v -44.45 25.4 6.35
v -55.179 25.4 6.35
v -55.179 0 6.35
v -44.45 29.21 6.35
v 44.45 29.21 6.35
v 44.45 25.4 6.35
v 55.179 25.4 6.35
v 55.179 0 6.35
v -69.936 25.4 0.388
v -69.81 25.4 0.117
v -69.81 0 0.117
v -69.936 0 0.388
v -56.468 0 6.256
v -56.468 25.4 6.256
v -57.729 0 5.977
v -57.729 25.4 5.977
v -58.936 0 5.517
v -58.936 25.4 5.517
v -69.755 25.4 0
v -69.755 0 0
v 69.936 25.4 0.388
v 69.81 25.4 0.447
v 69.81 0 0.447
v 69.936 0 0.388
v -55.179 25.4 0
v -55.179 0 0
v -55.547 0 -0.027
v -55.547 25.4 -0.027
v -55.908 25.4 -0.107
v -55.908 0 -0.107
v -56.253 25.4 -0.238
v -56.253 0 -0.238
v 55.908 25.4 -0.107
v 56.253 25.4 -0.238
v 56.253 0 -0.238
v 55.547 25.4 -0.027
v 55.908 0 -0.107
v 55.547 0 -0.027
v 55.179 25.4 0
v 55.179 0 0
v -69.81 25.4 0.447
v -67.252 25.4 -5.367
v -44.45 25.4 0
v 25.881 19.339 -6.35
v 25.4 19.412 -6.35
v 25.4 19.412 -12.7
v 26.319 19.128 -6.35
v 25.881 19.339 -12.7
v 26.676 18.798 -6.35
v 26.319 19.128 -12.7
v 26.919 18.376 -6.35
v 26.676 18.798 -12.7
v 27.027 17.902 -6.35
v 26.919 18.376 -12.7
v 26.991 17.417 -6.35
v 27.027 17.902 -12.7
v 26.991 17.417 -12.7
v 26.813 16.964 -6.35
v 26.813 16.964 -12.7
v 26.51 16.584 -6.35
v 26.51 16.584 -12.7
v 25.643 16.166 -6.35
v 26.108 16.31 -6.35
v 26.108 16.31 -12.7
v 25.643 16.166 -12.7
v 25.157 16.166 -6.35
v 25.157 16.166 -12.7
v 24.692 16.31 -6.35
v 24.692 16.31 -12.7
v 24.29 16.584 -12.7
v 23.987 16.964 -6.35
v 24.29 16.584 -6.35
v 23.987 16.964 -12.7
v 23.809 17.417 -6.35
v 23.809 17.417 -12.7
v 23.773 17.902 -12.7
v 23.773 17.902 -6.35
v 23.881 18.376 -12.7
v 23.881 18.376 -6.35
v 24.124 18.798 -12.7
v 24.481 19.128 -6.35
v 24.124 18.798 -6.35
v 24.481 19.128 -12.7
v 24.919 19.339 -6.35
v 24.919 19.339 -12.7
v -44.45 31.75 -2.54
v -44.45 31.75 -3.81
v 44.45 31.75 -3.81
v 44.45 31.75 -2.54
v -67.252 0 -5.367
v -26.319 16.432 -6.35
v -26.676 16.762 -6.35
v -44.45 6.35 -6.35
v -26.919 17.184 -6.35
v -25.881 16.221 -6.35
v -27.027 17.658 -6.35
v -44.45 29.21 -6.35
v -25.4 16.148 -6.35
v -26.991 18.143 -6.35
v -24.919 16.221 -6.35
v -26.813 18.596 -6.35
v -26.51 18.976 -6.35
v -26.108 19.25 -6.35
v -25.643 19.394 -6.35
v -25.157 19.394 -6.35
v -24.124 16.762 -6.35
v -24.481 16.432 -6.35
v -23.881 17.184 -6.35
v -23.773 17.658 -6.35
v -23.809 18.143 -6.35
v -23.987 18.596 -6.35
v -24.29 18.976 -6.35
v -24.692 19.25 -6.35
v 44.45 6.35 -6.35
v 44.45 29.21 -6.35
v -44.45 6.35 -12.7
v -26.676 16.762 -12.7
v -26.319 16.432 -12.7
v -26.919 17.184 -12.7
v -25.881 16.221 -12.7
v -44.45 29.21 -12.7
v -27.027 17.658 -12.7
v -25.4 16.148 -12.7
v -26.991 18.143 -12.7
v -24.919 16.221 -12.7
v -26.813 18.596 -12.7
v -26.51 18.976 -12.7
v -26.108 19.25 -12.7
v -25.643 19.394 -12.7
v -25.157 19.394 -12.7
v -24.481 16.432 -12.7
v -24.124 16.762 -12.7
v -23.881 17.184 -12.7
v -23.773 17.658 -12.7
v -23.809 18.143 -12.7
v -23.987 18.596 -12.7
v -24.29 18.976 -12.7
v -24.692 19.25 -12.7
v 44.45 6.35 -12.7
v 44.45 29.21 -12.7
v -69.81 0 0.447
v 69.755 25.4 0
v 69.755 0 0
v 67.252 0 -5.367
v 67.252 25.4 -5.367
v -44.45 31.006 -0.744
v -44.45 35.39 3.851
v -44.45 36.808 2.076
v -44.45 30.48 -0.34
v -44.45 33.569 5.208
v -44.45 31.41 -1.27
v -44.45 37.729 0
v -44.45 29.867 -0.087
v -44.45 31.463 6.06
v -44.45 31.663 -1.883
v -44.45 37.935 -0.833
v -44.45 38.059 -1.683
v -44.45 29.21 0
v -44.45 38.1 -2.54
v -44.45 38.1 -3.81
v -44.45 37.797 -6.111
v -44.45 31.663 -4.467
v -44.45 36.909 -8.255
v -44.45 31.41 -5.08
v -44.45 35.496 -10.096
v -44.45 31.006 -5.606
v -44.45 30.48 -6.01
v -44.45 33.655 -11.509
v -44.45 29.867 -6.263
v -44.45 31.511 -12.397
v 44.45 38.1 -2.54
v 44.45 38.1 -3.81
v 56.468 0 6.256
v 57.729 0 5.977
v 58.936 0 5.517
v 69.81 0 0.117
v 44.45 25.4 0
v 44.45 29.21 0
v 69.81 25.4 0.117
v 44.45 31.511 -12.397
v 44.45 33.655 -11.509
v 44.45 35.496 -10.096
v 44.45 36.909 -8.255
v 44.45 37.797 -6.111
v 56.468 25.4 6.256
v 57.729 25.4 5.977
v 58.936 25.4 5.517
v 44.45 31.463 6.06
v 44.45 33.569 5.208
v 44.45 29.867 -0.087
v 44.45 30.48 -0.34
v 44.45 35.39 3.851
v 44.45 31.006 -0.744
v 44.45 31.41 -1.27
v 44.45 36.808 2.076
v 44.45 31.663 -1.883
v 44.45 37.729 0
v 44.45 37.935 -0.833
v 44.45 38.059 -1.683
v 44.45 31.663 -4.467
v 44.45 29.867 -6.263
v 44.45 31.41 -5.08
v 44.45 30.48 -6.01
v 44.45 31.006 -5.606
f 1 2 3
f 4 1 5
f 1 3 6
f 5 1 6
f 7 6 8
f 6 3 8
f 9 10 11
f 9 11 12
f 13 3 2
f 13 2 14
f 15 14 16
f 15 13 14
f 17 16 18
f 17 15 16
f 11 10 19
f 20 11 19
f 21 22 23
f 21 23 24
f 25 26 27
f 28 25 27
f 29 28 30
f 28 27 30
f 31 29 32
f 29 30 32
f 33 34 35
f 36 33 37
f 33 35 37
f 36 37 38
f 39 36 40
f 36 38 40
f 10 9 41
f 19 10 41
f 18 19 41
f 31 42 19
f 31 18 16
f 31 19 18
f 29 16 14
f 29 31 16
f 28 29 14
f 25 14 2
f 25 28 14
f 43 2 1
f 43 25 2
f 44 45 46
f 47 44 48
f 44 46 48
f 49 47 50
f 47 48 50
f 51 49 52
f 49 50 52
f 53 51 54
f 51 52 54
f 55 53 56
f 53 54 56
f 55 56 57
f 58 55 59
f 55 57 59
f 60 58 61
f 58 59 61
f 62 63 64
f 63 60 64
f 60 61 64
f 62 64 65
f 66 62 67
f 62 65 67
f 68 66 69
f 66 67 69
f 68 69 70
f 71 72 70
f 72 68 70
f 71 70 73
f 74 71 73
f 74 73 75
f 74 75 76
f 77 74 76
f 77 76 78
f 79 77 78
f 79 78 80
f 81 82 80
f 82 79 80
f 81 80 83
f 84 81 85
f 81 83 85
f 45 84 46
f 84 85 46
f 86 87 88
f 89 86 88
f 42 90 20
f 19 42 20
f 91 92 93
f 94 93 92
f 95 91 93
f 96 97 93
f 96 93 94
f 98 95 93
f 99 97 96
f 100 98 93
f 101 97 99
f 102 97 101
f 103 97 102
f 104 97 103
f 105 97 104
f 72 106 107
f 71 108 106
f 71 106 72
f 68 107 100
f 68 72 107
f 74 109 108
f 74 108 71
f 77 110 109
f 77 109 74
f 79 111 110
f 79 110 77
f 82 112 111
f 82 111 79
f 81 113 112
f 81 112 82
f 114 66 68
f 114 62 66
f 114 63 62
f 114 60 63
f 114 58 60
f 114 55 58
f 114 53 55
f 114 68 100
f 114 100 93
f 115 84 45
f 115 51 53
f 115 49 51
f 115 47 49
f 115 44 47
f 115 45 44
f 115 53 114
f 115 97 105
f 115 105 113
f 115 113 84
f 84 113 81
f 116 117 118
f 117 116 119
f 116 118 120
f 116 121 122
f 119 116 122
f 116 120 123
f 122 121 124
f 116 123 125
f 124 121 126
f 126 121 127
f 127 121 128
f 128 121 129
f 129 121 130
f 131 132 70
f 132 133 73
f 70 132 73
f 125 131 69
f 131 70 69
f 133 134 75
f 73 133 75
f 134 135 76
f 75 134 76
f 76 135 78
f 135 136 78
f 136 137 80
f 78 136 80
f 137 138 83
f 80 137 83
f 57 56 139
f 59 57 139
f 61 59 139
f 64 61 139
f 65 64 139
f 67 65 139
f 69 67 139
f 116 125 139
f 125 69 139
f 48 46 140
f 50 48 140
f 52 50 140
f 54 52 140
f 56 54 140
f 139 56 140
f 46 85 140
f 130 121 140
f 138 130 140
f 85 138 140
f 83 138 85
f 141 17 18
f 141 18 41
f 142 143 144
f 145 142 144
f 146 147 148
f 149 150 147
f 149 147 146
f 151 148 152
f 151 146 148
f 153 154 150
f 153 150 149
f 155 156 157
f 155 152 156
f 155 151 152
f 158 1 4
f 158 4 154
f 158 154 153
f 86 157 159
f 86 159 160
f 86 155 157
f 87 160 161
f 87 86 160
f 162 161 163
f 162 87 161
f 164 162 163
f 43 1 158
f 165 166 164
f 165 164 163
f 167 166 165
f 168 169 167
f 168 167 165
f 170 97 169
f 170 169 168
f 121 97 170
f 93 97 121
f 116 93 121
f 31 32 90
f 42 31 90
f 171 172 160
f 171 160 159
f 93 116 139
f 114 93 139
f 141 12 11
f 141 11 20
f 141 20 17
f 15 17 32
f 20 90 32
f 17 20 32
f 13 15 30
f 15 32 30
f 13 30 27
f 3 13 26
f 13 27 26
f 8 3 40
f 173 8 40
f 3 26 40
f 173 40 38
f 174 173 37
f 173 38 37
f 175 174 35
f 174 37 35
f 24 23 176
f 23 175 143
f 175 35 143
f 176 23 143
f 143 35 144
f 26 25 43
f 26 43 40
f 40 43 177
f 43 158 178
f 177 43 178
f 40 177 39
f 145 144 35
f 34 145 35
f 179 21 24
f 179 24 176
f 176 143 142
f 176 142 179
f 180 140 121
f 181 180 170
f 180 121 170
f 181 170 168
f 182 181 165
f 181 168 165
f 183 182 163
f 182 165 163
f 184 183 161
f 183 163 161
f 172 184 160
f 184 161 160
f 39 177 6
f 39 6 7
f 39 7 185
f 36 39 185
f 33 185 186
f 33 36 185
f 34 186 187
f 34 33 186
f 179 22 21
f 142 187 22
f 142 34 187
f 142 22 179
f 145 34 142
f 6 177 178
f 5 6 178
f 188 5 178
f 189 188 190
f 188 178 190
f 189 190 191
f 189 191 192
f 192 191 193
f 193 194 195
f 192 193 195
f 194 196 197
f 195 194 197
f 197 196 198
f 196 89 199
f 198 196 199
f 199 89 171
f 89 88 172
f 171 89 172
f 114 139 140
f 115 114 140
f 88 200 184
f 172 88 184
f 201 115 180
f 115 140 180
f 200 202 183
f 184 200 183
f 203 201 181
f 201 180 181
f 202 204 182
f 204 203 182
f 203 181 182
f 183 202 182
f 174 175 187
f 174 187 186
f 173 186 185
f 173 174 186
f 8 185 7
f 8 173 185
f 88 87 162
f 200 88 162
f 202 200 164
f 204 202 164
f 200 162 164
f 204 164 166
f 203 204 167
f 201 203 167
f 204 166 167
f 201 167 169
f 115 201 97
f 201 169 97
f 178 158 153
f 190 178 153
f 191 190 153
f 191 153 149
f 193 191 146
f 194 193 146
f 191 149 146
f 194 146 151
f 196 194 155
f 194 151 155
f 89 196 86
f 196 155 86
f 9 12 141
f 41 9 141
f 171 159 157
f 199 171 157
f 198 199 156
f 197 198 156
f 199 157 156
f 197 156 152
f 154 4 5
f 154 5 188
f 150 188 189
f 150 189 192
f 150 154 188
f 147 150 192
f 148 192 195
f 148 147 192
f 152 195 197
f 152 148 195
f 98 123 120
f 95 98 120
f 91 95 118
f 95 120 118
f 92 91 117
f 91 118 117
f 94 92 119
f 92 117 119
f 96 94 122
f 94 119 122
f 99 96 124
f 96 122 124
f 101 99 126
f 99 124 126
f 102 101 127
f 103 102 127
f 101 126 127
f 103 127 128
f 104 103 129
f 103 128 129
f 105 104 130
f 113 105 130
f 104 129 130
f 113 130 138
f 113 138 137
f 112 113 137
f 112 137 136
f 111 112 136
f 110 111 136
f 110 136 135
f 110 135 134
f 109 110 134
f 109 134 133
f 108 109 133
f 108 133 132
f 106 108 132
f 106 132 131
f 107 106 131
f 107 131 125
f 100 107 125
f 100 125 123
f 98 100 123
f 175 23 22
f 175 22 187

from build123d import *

# Parameters (mm, degrees)
BOSS_EXTRUDE1_DEPTH    = 25.4
SKETCH2_W              = 88.9
SKETCH2_H              = 6.35
BOSS_EXTRUDE2_DEPTH    = 12.7
SKETCH3_W              = 88.9
SKETCH3_H              = 6.35
BOSS_EXTRUDE3_DEPTH    = 12.7
SKETCH4_W              = 88.9
SKETCH4_H              = 6.35
BOSS_EXTRUDE5_DEPTH    = 25.4
FILLET4_R              = 2.54
CONVERT_SOLID1_START   = -1
CONVERT_SOLID1_DEPTH   = 32.8041528
CONVERT_SOLID1_START_2 = -44.45
CONVERT_SOLID1_2_DEPTH = 88.9
CUT_EXTRUDE1_REACH     = 83.887
SKETCH6_R              = 1.63195
UNFOLD1_START          = -12.7
UNFOLD1_OUTLINE_R      = 1.63195
UNFOLD1_DEPTH          = 12.7
UNFOLD1_2_OUTLINE_W    = 1.190330825
UNFOLD1_2_OUTLINE_H    = 25.4
UNFOLD1_2_DEPTH        = 1.940687
UNFOLD1_3_OUTLINE_W    = 88.9
UNFOLD1_3_OUTLINE_H    = 45.894202015
UNFOLD1_3_OUTLINE_R    = 1.63195
UNFOLD1_3_DEPTH        = 6.35
FOLD1_START            = 38.1
FOLD1_OUTLINE_W        = 88.9
FOLD1_OUTLINE_H        = 6.35
FOLD1_DEPTH            = 33.194202015
FOLD1_2_DEPTH          = 25.4
FOLD1_START_2          = 6.35
FOLD1_3_OUTLINE_W      = 88.9
FOLD1_3_OUTLINE_H      = 6.35
FOLD1_3_DEPTH          = 9.7980499
FOLD1_START_3          = 19.4119501
FOLD1_4_OUTLINE_W      = 88.9
FOLD1_4_OUTLINE_H      = 6.35
FOLD1_4_DEPTH          = 9.7980499
FOLD1_START_4          = 31.75
FOLD1_5_OUTLINE_W      = 88.9
FOLD1_5_OUTLINE_H      = 6.35
FOLD1_5_DEPTH          = 5.563988164
FOLD1_6_DEPTH          = 25.4
FOLD1_START_5          = -44.45
FOLD1_7_DEPTH          = 88.9
FOLD1_START_6          = -12.7
FOLD1_8_DEPTH          = 6.35
FOLD1_9_DEPTH          = 88.9


with BuildPart() as part:
    # Sketch1 → Boss-Extrude1 (new body)
    with BuildSketch(Plane(origin=(0, 0, 0), x_dir=(1, 0, 0), z_dir=(0, 1, 0))):
        Polygon((-57.15, -6.35), (57.15, -6.35), (69.93597375, -0.387802524), (67.252347788, 5.367251924), (55.742238892, 0), (-55.742238892, 0), (-67.252347788, 5.367251924), (-69.93597375, -0.387802524), align=None)
    extrude(amount=BOSS_EXTRUDE1_DEPTH)

    # Sketch2 → Boss-Extrude2 (add)
    with BuildSketch(Plane(origin=(0, 25.4, 0), x_dir=(1, 0, 0), z_dir=(0, 1, 0))):
        with Locations((0, -3.175)):
            Rectangle(SKETCH2_W, SKETCH2_H)
    extrude(amount=BOSS_EXTRUDE2_DEPTH)

    # Sketch3 → Boss-Extrude3 (add)
    with BuildSketch(Plane(origin=(0, 0, 0), x_dir=(-1, 0, 0), z_dir=(0, 0, -1))):
        with Locations((0, 34.925)):
            Rectangle(SKETCH3_W, SKETCH3_H)
    extrude(amount=BOSS_EXTRUDE3_DEPTH)

    # Sketch4 → Boss-Extrude5 (add)
    with BuildSketch(Plane.XZ.offset(-31.75)):
        with Locations((0, -9.525)):
            Rectangle(SKETCH4_W, SKETCH4_H)
    extrude(amount=BOSS_EXTRUDE5_DEPTH)

    # Fillet4
    fillet4_edges = [part.edges().sort_by_distance(p)[0] for p in [
        (57.15, 12.7, 6.35),
        (-57.15, 12.7, 6.35),
        (-55.742238892, 12.7, 0),
        (55.742238892, 12.7, 0),
        (0, 38.1, 6.35),
        (0, 31.75, -6.35),
        (0, 38.1, -12.7),
        (0, 31.75, 0),
    ]]
    fillet(fillet4_edges, radius=FILLET4_R)

    # Convert-Solid1: read off the stored shape, not the designer's step
    # Convert-Solid1 outline → Convert-Solid1 (cut)
    with BuildSketch(Plane(origin=(0, 0, 0), x_dir=(1, 0, 0), z_dir=(0, 1, 0)).offset(CONVERT_SOLID1_START)):
        with BuildLine():
            ThreePointArc((58.936210796, -5.517076227), (57.103282617, -6.139271503), (55.179134449, -6.35))
            Line((55.179134449, -6.35), (56.586895557, -6.35))
            ThreePointArc((56.586895557, -6.35), (57.136652176, -6.289791858), (57.660345942, -6.112021779))
            Line((57.660345942, -6.112021779), (58.936210796, -5.517076227))
        make_face()
        with BuildLine():
            Line((-56.586895557, -6.35), (-55.179134449, -6.35))
            ThreePointArc((-55.179134449, -6.35), (-57.103282617, -6.139271503), (-58.936210796, -5.517076227))
            Line((-58.936210796, -5.517076227), (-57.660345942, -6.112021779))
            ThreePointArc((-57.660345942, -6.112021779), (-57.136652176, -6.289791858), (-56.586895557, -6.35))
        make_face()
    extrude(amount=CONVERT_SOLID1_DEPTH, mode=Mode.SUBTRACT)

    # Convert-Solid1 2 outline → Convert-Solid1 2 (cut)
    with BuildSketch(Plane.YZ.offset(CONVERT_SOLID1_START_2)):
        with BuildLine():
            ThreePointArc((29.21, 6.35), (35.496179285, 3.746179285), (38.1, -2.54))
            Line((38.1, -2.54), (38.1, 3.81))
            ThreePointArc((38.1, 3.81), (37.356051224, 5.606051224), (35.56, 6.35))
            Line((35.56, 6.35), (29.21, 6.35))
        make_face()
        with BuildLine():
            ThreePointArc((38.1, -3.81), (35.496179285, -10.096179285), (29.21, -12.7))
            Line((29.21, -12.7), (35.56, -12.7))
            ThreePointArc((35.56, -12.7), (37.356051224, -11.956051224), (38.1, -10.16))
            Line((38.1, -10.16), (38.1, -3.81))
        make_face()
    extrude(amount=CONVERT_SOLID1_2_DEPTH, mode=Mode.SUBTRACT)

    # Sketch6 → Cut-Extrude1 (cut, up to next)
    with BuildSketch(Plane(origin=(0, 0, -12.7), x_dir=(-1, 0, 0), z_dir=(0, 0, -1)), mode=Mode.PRIVATE) as cut_extrude1_sk1:
        with Locations((-25.4, 17.78)):
            Circle(SKETCH6_R)
    cut_extrude1_tool1 = extrude(cut_extrude1_sk1.sketch, amount=-CUT_EXTRUDE1_REACH, mode=Mode.PRIVATE) & part.part
    # Sketch6 → Cut-Extrude1 (cut, up to next)
    with BuildSketch(Plane(origin=(0, 0, -12.7), x_dir=(-1, 0, 0), z_dir=(0, 0, -1)), mode=Mode.PRIVATE) as cut_extrude1_sk2:
        with Locations((25.4, 17.78)):
            Circle(SKETCH6_R)
    cut_extrude1_tool2 = extrude(cut_extrude1_sk2.sketch, amount=-CUT_EXTRUDE1_REACH, mode=Mode.PRIVATE) & part.part
    add(cut_extrude1_tool1.solids().sort_by_distance((25.4, 17.78, -12.7))[0], mode=Mode.SUBTRACT)
    add(cut_extrude1_tool2.solids().sort_by_distance((-25.4, 17.78, -12.7))[0], mode=Mode.SUBTRACT)

    # Unfold1: read off the stored shape, not the designer's step
    # Unfold1 outline → Unfold1 (cut)
    with BuildSketch(Plane.XY.offset(UNFOLD1_START)):
        Polygon((44.45, 38.1), (-44.45, 38.1), (-44.45, 25.4), (-69.809669175, 25.4), (-69.809669175, 0), (69.809669175, 0), (69.809669175, 25.4), (44.45, 25.4), align=None)
        with Locations((25.4, 17.78)):
            Circle(UNFOLD1_OUTLINE_R, mode=Mode.SUBTRACT)
        with Locations((-25.4, 17.78)):
            Circle(UNFOLD1_OUTLINE_R, mode=Mode.SUBTRACT)
    extrude(amount=UNFOLD1_DEPTH, mode=Mode.SUBTRACT)

    # Unfold1 2 outline → Unfold1 2 (cut)
    with BuildSketch(Plane.XY):
        with Locations((-70.404834588, 12.7)):
            Rectangle(UNFOLD1_2_OUTLINE_W, UNFOLD1_2_OUTLINE_H)
        with Locations((70.404834588, 12.7)):
            Rectangle(UNFOLD1_2_OUTLINE_W, UNFOLD1_2_OUTLINE_H)
    extrude(amount=UNFOLD1_2_DEPTH, mode=Mode.SUBTRACT)

    # Unfold1 3 outline → Unfold1 3 (add)
    # profile 1 of 2: a face of its own
    with BuildSketch(Plane.XY):
        with Locations((0, 48.347101008)):
            Rectangle(UNFOLD1_3_OUTLINE_W, UNFOLD1_3_OUTLINE_H)
        with Locations((-25.4, 59.864202015)):
            Circle(UNFOLD1_3_OUTLINE_R, mode=Mode.SUBTRACT)
        with Locations((25.4, 59.864202015)):
            Circle(UNFOLD1_3_OUTLINE_R, mode=Mode.SUBTRACT)
    # profile 2 of 2: a face of its own
    with BuildSketch(Plane.XY):
        Polygon((-44.45, 6.35), (-44.45, 25.4), (-69.809669175, 25.4), (-69.809669175, 0), (69.809669175, 0), (69.809669175, 25.4), (44.45, 25.4), (44.45, 6.35), align=None)
    extrude(amount=UNFOLD1_3_DEPTH)

    # Fold1: read off the stored shape, not the designer's step
    # Fold1 outline → Fold1 (cut)
    with BuildSketch(Plane(origin=(0, 0, 0), x_dir=(1, 0, 0), z_dir=(0, 1, 0)).offset(FOLD1_START)):
        with Locations((0, -3.175)):
            Rectangle(FOLD1_OUTLINE_W, FOLD1_OUTLINE_H)
    extrude(amount=FOLD1_DEPTH, mode=Mode.SUBTRACT)

    # Fold1 2 outline → Fold1 2 (cut)
    with BuildSketch(Plane(origin=(0, 0, 0), x_dir=(1, 0, 0), z_dir=(0, 1, 0))):
        with BuildLine():
            Line((-58.936210796, -5.517076227), (-69.809669175, -0.446699315))
            Line((-69.809669175, -0.446699315), (-69.809669175, -6.35))
            Line((-69.809669175, -6.35), (-55.179134449, -6.35))
            ThreePointArc((-55.179134449, -6.35), (-57.103282617, -6.139271503), (-58.936210796, -5.517076227))
        make_face()
        Polygon((-69.809669175, -0.116941489), (-69.755138463, 0), (-69.809669175, 0), align=None)
        with BuildLine():
            Line((69.809669175, -6.35), (69.809669175, -0.446699315))
            Line((69.809669175, -0.446699315), (58.936210796, -5.517076227))
            ThreePointArc((58.936210796, -5.517076227), (57.103282617, -6.139271503), (55.179134449, -6.35))
            Line((55.179134449, -6.35), (69.809669175, -6.35))
        make_face()
        Polygon((69.809669175, 0), (69.755138463, 0), (69.809669175, -0.116941489), align=None)
    extrude(amount=FOLD1_2_DEPTH, mode=Mode.SUBTRACT)

    # Fold1 3 outline → Fold1 3 (add)
    with BuildSketch(Plane(origin=(0, 0, 0), x_dir=(1, 0, 0), z_dir=(0, 1, 0)).offset(FOLD1_START_2)):
        with Locations((0, 9.525)):
            Rectangle(FOLD1_3_OUTLINE_W, FOLD1_3_OUTLINE_H)
        Polygon((-69.809669175, -0.446699315), (-69.809669175, -0.116941489), (-69.93597375, -0.387802524), align=None)
        with BuildLine():
            ThreePointArc((-55.179134449, 0), (-55.728891069, 0.060208142), (-56.252584834, 0.237978221))
            Line((-56.252584834, 0.237978221), (-67.252347788, 5.367251924))
            Line((-67.252347788, 5.367251924), (-69.755138463, 0))
            Line((-69.755138463, 0), (-55.179134449, 0))
        make_face()
        with BuildLine():
            Line((67.252347788, 5.367251924), (56.252584834, 0.237978221))
            ThreePointArc((56.252584834, 0.237978221), (55.728891069, 0.060208142), (55.179134449, 0))
            Line((55.179134449, 0), (69.755138463, 0))
            Line((69.755138463, 0), (67.252347788, 5.367251924))
        make_face()
        Polygon((69.93597375, -0.387802524), (69.809669175, -0.116941489), (69.809669175, -0.446699315), align=None)
    extrude(amount=FOLD1_3_DEPTH)

    # Fold1 5 outline → Fold1 5 (add)
    with BuildSketch(Plane(origin=(0, 0, 0), x_dir=(1, 0, 0), z_dir=(0, 1, 0)).offset(FOLD1_START_4)):
        with Locations((0, 3.175)):
            Rectangle(FOLD1_5_OUTLINE_W, FOLD1_5_OUTLINE_H)
    extrude(amount=FOLD1_5_DEPTH)

    # Fold1 6 outline → Fold1 6 (add)
    with BuildSketch(Plane(origin=(0, 0, 0), x_dir=(1, 0, 0), z_dir=(0, 1, 0))):
        Polygon((-69.809669175, -0.446699315), (-69.809669175, -0.116941489), (-69.93597375, -0.387802524), align=None)
        with BuildLine():
            ThreePointArc((-55.179134449, 0), (-55.728891069, 0.060208142), (-56.252584834, 0.237978221))
            Line((-56.252584834, 0.237978221), (-67.252347788, 5.367251924))
            Line((-67.252347788, 5.367251924), (-69.755138463, 0))
            Line((-69.755138463, 0), (-55.179134449, 0))
        make_face()
        with BuildLine():
            Line((67.252347788, 5.367251924), (56.252584834, 0.237978221))
            ThreePointArc((56.252584834, 0.237978221), (55.728891069, 0.060208142), (55.179134449, 0))
            Line((55.179134449, 0), (69.755138463, 0))
            Line((69.755138463, 0), (67.252347788, 5.367251924))
        make_face()
        Polygon((69.93597375, -0.387802524), (69.809669175, -0.116941489), (69.809669175, -0.446699315), align=None)
    extrude(amount=FOLD1_6_DEPTH)



with BuildPart() as body_2:
    # Fold1 4 outline → Fold1 4 (new body)
    with BuildSketch(Plane(origin=(0, 0, 0), x_dir=(1, 0, 0), z_dir=(0, 1, 0)).offset(FOLD1_START_3)):
        with Locations((0, 9.525)):
            Rectangle(FOLD1_4_OUTLINE_W, FOLD1_4_OUTLINE_H)
    extrude(amount=FOLD1_4_DEPTH)


with BuildPart() as part_1:
    add(part.part)

    add(body_2.part)  # Fold1 7 merges body 2
    # Fold1 7 outline → Fold1 7 (add)
    with BuildSketch(Plane.YZ.offset(FOLD1_START_5)):
        with BuildLine():
            ThreePointArc((29.21, -12.7), (35.496179285, -10.096179285), (38.1, -3.81))
            Line((38.1, -3.81), (38.1, -2.54))
            ThreePointArc((38.1, -2.54), (38.00686691, -1.256554415), (37.729418994, 0))
            Line((37.729418994, 0), (37.313988164, 0))
            Line((37.313988164, 0), (37.313988164, -6.35))
            Line((37.313988164, -6.35), (31.75, -6.35))
            Line((31.75, -6.35), (31.75, -3.81))
            ThreePointArc((31.75, -3.81), (31.006051224, -5.606051224), (29.21, -6.35))
            Line((29.21, -6.35), (29.21, -12.7))
        make_face()
        with BuildLine():
            ThreePointArc((29.21, 0), (31.006051224, -0.743948776), (31.75, -2.54))
            Line((31.75, -2.54), (31.75, 0))
            Line((31.75, 0), (29.21, 0))
        make_face()
    extrude(amount=FOLD1_7_DEPTH)

    # Fold1 8 outline → Fold1 8 (add)
    with BuildSketch(Plane.XY.offset(FOLD1_START_6)):
        with BuildLine():
            ThreePointArc((25.4, 19.41195), (27.03195, 17.78), (25.4, 16.14805))
            Line((25.4, 16.14805), (44.45, 16.1480499))
            Line((44.45, 16.1480499), (44.45, 19.4119501))
            Line((44.45, 19.4119501), (25.4, 19.41195))
        make_face()
        with BuildLine():
            ThreePointArc((25.4, 16.14805), (23.76805, 17.78), (25.4, 19.41195))
            Line((25.4, 19.41195), (-25.399999965, 19.41195))
            ThreePointArc((-25.399999965, 19.41195), (-23.76805, 17.779999965), (-25.400000035, 16.14805))
            Line((-25.400000035, 16.14805), (25.4, 16.14805))
        make_face()
        with BuildLine():
            ThreePointArc((-25.400000035, 16.14805), (-27.03195, 17.780000035), (-25.399999965, 19.41195))
            Line((-25.399999965, 19.41195), (-44.45, 19.4119501))
            Line((-44.45, 19.4119501), (-44.45, 16.1480499))
            Line((-44.45, 16.1480499), (-25.400000035, 16.14805))
        make_face()
    extrude(amount=FOLD1_8_DEPTH)

    # Fold1 9 outline → Fold1 9 (cut)
    with BuildSketch(Plane.YZ.offset(FOLD1_START_5)):
        with BuildLine():
            ThreePointArc((29.21, 6.35), (34.522791169, 4.587857322), (37.729418994, 0))
            Line((37.729418994, 0), (38.1, 0))
            Line((38.1, 0), (38.1, 6.35))
            Line((38.1, 6.35), (29.21, 6.35))
        make_face()
    extrude(amount=FOLD1_9_DEPTH, mode=Mode.SUBTRACT)


solid = part_1.part
